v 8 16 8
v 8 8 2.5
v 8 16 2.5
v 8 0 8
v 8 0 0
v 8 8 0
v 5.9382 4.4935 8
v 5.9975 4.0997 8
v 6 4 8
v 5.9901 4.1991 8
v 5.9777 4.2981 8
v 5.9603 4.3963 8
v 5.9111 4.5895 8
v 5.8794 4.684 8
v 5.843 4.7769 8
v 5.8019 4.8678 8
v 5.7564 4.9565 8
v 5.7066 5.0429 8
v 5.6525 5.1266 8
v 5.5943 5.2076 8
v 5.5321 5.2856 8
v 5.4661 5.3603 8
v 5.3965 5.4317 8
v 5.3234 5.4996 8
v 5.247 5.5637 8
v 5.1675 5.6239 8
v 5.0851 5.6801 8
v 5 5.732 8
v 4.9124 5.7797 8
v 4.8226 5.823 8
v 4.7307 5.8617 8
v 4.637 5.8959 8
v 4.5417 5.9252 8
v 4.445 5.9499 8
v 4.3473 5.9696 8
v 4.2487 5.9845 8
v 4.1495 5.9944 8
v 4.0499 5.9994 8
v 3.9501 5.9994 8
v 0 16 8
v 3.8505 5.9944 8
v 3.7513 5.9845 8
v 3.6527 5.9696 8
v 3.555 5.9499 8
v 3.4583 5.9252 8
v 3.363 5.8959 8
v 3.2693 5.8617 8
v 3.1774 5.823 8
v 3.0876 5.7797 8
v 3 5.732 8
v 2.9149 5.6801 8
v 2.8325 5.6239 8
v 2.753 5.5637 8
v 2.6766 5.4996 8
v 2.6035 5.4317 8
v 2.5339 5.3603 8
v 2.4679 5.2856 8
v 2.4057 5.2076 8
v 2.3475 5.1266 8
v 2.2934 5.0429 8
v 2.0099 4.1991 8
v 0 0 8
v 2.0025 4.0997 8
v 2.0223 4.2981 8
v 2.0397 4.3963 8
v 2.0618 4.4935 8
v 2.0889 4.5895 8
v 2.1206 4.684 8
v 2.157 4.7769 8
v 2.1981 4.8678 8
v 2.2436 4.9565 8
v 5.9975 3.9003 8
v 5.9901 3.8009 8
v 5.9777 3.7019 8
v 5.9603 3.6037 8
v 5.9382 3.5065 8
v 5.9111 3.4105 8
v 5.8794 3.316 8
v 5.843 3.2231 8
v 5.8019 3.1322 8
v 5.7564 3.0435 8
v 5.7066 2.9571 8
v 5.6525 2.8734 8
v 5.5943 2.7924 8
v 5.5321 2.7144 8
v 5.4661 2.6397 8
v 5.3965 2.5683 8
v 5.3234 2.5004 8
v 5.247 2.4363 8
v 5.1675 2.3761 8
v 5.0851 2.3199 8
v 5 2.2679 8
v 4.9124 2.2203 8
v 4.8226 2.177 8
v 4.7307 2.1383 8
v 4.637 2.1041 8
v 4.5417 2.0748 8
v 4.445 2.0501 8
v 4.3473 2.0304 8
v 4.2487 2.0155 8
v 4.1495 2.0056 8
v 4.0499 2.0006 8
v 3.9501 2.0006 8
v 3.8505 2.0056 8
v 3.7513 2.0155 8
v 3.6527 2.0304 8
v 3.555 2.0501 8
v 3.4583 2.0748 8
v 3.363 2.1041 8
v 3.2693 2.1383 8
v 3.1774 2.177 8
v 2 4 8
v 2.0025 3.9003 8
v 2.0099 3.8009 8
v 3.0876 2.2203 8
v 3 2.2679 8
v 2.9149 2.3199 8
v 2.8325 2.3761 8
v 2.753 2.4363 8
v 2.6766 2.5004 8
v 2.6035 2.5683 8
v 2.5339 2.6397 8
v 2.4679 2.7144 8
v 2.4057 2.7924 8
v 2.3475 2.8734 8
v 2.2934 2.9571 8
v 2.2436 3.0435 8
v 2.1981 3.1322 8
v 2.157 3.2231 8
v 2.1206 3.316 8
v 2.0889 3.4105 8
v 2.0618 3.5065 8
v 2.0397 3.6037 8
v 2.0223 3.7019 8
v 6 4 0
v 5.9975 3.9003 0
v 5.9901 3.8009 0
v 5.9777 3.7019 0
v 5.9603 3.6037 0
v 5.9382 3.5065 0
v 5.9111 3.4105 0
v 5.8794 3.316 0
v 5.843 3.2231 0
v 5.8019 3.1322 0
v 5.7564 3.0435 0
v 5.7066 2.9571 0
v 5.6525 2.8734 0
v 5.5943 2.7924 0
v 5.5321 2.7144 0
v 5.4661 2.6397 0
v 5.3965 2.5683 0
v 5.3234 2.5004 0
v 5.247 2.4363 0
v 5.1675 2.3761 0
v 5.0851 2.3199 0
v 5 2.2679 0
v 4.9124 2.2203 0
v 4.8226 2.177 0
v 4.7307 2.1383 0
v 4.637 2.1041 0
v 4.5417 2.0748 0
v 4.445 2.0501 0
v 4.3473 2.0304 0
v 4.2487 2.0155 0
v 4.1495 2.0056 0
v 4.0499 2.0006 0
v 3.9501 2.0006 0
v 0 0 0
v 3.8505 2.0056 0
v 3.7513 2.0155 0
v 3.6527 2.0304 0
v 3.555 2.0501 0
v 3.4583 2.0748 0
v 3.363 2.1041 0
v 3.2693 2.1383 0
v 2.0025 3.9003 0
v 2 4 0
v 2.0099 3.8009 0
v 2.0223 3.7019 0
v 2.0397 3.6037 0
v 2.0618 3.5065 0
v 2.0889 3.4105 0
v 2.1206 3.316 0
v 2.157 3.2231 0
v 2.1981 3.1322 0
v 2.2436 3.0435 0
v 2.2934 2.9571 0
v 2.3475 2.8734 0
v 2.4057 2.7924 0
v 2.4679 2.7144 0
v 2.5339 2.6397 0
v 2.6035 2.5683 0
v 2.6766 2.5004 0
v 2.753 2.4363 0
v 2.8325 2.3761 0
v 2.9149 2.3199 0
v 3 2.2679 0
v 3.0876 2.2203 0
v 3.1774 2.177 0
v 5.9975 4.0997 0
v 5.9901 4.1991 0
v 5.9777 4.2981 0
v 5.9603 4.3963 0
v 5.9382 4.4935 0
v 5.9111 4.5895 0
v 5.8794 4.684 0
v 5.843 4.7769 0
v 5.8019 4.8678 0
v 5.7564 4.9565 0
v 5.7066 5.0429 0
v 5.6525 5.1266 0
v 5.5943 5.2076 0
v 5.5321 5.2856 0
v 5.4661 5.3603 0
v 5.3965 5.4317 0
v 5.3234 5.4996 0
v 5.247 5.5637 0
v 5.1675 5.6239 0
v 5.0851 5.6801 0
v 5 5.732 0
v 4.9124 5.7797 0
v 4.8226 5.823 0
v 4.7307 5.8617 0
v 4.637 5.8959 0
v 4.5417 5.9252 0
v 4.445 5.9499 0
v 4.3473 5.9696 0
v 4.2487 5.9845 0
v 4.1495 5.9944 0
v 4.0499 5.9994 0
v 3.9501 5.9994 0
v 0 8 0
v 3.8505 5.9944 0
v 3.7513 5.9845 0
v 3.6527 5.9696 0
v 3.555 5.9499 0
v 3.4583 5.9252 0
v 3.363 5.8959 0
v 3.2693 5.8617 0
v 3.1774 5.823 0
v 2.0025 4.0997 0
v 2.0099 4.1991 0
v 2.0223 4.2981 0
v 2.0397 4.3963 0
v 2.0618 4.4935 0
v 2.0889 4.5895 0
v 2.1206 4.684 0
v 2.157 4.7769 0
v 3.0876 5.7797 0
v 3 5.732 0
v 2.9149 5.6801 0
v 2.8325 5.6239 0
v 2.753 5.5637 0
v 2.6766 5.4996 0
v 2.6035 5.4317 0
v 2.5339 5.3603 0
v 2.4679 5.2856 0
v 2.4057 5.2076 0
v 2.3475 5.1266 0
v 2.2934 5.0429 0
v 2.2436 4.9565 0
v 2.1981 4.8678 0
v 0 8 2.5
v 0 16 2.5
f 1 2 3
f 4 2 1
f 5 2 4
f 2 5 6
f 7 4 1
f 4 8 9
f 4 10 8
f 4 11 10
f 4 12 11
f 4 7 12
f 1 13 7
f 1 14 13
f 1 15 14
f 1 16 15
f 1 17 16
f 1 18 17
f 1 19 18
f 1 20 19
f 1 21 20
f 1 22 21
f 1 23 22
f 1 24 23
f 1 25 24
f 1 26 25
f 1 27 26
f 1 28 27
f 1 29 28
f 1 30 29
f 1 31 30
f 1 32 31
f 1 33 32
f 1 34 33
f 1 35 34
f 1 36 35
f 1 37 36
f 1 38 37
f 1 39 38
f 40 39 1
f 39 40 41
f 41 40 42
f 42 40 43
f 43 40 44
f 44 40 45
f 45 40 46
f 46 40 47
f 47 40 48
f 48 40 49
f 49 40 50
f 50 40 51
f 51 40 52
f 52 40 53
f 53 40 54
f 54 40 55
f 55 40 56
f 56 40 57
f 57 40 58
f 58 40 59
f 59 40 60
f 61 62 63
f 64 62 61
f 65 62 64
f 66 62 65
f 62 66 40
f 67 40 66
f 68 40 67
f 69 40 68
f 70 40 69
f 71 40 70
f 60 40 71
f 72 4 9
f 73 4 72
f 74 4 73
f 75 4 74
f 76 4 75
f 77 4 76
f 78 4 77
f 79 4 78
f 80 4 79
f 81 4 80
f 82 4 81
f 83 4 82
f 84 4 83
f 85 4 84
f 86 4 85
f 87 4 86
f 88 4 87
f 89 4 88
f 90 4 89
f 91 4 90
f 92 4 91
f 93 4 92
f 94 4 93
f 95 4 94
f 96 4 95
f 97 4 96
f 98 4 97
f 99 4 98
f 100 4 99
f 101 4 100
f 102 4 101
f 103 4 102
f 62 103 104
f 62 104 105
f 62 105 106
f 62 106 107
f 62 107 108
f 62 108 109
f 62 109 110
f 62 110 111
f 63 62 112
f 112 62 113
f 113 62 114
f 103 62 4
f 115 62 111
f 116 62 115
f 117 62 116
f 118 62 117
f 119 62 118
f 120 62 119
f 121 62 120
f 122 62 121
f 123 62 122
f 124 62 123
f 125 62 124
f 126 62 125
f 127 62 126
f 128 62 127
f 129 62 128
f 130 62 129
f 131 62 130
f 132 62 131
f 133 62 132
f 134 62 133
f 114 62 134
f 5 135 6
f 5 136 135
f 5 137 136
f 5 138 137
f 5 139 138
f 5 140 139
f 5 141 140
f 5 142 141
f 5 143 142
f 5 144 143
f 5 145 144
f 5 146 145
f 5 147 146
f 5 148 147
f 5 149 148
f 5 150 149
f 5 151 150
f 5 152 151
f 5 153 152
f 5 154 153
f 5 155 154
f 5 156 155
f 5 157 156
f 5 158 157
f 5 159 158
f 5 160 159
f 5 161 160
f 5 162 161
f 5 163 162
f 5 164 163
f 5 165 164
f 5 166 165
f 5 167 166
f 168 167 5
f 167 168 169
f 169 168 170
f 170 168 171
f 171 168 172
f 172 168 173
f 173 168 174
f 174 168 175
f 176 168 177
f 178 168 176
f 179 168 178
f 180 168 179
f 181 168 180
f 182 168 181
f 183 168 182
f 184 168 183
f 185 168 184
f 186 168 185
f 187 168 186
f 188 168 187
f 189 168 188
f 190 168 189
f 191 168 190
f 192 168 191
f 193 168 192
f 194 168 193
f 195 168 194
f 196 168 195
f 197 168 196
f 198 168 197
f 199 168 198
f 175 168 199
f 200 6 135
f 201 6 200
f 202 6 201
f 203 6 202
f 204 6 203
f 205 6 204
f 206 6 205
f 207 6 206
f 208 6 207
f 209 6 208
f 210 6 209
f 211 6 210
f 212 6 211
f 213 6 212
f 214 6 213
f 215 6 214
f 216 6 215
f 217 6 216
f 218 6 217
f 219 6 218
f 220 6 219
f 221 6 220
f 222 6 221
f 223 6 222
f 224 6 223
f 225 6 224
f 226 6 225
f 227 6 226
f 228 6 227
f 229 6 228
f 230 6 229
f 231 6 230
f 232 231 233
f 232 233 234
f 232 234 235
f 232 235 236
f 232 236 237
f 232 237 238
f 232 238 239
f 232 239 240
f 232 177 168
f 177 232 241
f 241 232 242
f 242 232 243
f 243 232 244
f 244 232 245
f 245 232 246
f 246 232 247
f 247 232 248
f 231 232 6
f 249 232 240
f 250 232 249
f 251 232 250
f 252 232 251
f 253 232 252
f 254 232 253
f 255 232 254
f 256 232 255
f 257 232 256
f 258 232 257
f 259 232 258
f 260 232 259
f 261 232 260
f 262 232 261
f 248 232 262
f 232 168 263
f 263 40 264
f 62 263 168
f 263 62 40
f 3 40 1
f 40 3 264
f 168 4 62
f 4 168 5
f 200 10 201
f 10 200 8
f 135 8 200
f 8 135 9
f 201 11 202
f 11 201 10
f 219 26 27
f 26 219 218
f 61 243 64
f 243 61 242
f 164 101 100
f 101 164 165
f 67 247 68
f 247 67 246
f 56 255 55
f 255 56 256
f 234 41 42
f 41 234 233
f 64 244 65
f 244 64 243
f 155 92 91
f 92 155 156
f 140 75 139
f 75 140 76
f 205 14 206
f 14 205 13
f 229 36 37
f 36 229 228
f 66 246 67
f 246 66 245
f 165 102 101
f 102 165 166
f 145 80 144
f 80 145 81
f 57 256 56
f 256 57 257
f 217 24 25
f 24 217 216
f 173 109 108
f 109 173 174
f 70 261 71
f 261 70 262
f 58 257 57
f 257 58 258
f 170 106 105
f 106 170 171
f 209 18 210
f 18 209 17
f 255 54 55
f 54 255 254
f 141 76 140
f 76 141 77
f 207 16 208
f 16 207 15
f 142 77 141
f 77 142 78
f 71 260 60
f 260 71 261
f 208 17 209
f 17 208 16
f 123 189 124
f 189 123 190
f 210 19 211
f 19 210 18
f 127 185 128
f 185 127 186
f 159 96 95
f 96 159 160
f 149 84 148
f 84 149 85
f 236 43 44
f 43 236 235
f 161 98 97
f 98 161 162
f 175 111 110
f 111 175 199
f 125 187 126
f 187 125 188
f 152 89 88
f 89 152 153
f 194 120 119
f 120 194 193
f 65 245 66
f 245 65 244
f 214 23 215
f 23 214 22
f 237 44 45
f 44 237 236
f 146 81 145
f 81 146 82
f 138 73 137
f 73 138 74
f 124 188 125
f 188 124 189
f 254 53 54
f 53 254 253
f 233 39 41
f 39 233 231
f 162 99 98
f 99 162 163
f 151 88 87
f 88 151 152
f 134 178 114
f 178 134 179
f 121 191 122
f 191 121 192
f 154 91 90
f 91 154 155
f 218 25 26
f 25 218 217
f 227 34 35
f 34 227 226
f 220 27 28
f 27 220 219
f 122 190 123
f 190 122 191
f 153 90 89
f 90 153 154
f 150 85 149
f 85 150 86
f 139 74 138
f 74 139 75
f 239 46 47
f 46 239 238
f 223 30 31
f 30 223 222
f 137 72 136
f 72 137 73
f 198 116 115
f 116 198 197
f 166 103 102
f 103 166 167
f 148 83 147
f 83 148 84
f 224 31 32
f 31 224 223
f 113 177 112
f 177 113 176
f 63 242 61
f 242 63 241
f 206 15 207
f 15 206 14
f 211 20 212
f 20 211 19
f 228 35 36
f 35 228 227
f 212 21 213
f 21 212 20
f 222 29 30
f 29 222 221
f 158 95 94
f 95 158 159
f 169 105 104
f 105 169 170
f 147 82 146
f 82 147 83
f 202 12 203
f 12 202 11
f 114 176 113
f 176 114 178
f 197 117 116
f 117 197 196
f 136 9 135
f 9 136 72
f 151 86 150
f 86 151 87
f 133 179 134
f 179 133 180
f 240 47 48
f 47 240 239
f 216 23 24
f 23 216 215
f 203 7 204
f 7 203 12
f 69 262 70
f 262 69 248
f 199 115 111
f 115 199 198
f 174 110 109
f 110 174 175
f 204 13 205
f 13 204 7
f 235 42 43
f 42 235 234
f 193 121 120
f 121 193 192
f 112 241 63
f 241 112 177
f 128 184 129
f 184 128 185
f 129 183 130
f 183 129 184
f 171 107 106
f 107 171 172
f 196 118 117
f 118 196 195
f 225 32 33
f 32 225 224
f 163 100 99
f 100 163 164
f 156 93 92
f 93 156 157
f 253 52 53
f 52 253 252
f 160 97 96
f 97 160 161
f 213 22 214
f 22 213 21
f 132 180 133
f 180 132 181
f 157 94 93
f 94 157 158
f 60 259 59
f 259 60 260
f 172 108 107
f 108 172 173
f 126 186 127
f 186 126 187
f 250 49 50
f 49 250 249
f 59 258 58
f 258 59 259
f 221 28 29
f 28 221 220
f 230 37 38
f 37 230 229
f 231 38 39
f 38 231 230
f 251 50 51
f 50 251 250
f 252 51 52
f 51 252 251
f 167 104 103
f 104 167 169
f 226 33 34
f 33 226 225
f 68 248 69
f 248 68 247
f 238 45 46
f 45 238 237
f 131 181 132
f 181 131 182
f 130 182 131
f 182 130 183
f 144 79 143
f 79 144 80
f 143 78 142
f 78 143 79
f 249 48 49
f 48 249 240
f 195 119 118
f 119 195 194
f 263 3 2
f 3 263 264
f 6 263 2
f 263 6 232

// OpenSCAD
// file: config.scad
// Confdiguration for M4 screw

// configuration
space = 4;
hole = 4;
pad = space/2;
thickness = 2;

// multiplier for hole size
hfix = 1.15;
ufix = 1.05;

// servomotor
sm_body_x = 40.7;
sm_body_y = 20;
sm_body_z = 40.6;
sm_body_low_z = 28.6;
sm_axe_r = 2.9;
sm_axe_x = 6.8 + sm_axe_r; // Distance à la bordure la plus proche avec support
// main file
include <config.scad>;


module fixation() {
    $fa = 1;
    $fs = 0.1;

    h_max = hole+space;
    h_min = 2.5;
    difference() {
        cube([hole+space, (hole+space) * 2, h_max]);
        translate([space/2+hole/2, space/2+hole/2, 0]) {
            cylinder(h=h_max, r = hole/2);
        }
        translate([0, hole+space, 0]) {
            cube([hole+space, (hole+space), h_min]);
        }
    }


}


fixation();
